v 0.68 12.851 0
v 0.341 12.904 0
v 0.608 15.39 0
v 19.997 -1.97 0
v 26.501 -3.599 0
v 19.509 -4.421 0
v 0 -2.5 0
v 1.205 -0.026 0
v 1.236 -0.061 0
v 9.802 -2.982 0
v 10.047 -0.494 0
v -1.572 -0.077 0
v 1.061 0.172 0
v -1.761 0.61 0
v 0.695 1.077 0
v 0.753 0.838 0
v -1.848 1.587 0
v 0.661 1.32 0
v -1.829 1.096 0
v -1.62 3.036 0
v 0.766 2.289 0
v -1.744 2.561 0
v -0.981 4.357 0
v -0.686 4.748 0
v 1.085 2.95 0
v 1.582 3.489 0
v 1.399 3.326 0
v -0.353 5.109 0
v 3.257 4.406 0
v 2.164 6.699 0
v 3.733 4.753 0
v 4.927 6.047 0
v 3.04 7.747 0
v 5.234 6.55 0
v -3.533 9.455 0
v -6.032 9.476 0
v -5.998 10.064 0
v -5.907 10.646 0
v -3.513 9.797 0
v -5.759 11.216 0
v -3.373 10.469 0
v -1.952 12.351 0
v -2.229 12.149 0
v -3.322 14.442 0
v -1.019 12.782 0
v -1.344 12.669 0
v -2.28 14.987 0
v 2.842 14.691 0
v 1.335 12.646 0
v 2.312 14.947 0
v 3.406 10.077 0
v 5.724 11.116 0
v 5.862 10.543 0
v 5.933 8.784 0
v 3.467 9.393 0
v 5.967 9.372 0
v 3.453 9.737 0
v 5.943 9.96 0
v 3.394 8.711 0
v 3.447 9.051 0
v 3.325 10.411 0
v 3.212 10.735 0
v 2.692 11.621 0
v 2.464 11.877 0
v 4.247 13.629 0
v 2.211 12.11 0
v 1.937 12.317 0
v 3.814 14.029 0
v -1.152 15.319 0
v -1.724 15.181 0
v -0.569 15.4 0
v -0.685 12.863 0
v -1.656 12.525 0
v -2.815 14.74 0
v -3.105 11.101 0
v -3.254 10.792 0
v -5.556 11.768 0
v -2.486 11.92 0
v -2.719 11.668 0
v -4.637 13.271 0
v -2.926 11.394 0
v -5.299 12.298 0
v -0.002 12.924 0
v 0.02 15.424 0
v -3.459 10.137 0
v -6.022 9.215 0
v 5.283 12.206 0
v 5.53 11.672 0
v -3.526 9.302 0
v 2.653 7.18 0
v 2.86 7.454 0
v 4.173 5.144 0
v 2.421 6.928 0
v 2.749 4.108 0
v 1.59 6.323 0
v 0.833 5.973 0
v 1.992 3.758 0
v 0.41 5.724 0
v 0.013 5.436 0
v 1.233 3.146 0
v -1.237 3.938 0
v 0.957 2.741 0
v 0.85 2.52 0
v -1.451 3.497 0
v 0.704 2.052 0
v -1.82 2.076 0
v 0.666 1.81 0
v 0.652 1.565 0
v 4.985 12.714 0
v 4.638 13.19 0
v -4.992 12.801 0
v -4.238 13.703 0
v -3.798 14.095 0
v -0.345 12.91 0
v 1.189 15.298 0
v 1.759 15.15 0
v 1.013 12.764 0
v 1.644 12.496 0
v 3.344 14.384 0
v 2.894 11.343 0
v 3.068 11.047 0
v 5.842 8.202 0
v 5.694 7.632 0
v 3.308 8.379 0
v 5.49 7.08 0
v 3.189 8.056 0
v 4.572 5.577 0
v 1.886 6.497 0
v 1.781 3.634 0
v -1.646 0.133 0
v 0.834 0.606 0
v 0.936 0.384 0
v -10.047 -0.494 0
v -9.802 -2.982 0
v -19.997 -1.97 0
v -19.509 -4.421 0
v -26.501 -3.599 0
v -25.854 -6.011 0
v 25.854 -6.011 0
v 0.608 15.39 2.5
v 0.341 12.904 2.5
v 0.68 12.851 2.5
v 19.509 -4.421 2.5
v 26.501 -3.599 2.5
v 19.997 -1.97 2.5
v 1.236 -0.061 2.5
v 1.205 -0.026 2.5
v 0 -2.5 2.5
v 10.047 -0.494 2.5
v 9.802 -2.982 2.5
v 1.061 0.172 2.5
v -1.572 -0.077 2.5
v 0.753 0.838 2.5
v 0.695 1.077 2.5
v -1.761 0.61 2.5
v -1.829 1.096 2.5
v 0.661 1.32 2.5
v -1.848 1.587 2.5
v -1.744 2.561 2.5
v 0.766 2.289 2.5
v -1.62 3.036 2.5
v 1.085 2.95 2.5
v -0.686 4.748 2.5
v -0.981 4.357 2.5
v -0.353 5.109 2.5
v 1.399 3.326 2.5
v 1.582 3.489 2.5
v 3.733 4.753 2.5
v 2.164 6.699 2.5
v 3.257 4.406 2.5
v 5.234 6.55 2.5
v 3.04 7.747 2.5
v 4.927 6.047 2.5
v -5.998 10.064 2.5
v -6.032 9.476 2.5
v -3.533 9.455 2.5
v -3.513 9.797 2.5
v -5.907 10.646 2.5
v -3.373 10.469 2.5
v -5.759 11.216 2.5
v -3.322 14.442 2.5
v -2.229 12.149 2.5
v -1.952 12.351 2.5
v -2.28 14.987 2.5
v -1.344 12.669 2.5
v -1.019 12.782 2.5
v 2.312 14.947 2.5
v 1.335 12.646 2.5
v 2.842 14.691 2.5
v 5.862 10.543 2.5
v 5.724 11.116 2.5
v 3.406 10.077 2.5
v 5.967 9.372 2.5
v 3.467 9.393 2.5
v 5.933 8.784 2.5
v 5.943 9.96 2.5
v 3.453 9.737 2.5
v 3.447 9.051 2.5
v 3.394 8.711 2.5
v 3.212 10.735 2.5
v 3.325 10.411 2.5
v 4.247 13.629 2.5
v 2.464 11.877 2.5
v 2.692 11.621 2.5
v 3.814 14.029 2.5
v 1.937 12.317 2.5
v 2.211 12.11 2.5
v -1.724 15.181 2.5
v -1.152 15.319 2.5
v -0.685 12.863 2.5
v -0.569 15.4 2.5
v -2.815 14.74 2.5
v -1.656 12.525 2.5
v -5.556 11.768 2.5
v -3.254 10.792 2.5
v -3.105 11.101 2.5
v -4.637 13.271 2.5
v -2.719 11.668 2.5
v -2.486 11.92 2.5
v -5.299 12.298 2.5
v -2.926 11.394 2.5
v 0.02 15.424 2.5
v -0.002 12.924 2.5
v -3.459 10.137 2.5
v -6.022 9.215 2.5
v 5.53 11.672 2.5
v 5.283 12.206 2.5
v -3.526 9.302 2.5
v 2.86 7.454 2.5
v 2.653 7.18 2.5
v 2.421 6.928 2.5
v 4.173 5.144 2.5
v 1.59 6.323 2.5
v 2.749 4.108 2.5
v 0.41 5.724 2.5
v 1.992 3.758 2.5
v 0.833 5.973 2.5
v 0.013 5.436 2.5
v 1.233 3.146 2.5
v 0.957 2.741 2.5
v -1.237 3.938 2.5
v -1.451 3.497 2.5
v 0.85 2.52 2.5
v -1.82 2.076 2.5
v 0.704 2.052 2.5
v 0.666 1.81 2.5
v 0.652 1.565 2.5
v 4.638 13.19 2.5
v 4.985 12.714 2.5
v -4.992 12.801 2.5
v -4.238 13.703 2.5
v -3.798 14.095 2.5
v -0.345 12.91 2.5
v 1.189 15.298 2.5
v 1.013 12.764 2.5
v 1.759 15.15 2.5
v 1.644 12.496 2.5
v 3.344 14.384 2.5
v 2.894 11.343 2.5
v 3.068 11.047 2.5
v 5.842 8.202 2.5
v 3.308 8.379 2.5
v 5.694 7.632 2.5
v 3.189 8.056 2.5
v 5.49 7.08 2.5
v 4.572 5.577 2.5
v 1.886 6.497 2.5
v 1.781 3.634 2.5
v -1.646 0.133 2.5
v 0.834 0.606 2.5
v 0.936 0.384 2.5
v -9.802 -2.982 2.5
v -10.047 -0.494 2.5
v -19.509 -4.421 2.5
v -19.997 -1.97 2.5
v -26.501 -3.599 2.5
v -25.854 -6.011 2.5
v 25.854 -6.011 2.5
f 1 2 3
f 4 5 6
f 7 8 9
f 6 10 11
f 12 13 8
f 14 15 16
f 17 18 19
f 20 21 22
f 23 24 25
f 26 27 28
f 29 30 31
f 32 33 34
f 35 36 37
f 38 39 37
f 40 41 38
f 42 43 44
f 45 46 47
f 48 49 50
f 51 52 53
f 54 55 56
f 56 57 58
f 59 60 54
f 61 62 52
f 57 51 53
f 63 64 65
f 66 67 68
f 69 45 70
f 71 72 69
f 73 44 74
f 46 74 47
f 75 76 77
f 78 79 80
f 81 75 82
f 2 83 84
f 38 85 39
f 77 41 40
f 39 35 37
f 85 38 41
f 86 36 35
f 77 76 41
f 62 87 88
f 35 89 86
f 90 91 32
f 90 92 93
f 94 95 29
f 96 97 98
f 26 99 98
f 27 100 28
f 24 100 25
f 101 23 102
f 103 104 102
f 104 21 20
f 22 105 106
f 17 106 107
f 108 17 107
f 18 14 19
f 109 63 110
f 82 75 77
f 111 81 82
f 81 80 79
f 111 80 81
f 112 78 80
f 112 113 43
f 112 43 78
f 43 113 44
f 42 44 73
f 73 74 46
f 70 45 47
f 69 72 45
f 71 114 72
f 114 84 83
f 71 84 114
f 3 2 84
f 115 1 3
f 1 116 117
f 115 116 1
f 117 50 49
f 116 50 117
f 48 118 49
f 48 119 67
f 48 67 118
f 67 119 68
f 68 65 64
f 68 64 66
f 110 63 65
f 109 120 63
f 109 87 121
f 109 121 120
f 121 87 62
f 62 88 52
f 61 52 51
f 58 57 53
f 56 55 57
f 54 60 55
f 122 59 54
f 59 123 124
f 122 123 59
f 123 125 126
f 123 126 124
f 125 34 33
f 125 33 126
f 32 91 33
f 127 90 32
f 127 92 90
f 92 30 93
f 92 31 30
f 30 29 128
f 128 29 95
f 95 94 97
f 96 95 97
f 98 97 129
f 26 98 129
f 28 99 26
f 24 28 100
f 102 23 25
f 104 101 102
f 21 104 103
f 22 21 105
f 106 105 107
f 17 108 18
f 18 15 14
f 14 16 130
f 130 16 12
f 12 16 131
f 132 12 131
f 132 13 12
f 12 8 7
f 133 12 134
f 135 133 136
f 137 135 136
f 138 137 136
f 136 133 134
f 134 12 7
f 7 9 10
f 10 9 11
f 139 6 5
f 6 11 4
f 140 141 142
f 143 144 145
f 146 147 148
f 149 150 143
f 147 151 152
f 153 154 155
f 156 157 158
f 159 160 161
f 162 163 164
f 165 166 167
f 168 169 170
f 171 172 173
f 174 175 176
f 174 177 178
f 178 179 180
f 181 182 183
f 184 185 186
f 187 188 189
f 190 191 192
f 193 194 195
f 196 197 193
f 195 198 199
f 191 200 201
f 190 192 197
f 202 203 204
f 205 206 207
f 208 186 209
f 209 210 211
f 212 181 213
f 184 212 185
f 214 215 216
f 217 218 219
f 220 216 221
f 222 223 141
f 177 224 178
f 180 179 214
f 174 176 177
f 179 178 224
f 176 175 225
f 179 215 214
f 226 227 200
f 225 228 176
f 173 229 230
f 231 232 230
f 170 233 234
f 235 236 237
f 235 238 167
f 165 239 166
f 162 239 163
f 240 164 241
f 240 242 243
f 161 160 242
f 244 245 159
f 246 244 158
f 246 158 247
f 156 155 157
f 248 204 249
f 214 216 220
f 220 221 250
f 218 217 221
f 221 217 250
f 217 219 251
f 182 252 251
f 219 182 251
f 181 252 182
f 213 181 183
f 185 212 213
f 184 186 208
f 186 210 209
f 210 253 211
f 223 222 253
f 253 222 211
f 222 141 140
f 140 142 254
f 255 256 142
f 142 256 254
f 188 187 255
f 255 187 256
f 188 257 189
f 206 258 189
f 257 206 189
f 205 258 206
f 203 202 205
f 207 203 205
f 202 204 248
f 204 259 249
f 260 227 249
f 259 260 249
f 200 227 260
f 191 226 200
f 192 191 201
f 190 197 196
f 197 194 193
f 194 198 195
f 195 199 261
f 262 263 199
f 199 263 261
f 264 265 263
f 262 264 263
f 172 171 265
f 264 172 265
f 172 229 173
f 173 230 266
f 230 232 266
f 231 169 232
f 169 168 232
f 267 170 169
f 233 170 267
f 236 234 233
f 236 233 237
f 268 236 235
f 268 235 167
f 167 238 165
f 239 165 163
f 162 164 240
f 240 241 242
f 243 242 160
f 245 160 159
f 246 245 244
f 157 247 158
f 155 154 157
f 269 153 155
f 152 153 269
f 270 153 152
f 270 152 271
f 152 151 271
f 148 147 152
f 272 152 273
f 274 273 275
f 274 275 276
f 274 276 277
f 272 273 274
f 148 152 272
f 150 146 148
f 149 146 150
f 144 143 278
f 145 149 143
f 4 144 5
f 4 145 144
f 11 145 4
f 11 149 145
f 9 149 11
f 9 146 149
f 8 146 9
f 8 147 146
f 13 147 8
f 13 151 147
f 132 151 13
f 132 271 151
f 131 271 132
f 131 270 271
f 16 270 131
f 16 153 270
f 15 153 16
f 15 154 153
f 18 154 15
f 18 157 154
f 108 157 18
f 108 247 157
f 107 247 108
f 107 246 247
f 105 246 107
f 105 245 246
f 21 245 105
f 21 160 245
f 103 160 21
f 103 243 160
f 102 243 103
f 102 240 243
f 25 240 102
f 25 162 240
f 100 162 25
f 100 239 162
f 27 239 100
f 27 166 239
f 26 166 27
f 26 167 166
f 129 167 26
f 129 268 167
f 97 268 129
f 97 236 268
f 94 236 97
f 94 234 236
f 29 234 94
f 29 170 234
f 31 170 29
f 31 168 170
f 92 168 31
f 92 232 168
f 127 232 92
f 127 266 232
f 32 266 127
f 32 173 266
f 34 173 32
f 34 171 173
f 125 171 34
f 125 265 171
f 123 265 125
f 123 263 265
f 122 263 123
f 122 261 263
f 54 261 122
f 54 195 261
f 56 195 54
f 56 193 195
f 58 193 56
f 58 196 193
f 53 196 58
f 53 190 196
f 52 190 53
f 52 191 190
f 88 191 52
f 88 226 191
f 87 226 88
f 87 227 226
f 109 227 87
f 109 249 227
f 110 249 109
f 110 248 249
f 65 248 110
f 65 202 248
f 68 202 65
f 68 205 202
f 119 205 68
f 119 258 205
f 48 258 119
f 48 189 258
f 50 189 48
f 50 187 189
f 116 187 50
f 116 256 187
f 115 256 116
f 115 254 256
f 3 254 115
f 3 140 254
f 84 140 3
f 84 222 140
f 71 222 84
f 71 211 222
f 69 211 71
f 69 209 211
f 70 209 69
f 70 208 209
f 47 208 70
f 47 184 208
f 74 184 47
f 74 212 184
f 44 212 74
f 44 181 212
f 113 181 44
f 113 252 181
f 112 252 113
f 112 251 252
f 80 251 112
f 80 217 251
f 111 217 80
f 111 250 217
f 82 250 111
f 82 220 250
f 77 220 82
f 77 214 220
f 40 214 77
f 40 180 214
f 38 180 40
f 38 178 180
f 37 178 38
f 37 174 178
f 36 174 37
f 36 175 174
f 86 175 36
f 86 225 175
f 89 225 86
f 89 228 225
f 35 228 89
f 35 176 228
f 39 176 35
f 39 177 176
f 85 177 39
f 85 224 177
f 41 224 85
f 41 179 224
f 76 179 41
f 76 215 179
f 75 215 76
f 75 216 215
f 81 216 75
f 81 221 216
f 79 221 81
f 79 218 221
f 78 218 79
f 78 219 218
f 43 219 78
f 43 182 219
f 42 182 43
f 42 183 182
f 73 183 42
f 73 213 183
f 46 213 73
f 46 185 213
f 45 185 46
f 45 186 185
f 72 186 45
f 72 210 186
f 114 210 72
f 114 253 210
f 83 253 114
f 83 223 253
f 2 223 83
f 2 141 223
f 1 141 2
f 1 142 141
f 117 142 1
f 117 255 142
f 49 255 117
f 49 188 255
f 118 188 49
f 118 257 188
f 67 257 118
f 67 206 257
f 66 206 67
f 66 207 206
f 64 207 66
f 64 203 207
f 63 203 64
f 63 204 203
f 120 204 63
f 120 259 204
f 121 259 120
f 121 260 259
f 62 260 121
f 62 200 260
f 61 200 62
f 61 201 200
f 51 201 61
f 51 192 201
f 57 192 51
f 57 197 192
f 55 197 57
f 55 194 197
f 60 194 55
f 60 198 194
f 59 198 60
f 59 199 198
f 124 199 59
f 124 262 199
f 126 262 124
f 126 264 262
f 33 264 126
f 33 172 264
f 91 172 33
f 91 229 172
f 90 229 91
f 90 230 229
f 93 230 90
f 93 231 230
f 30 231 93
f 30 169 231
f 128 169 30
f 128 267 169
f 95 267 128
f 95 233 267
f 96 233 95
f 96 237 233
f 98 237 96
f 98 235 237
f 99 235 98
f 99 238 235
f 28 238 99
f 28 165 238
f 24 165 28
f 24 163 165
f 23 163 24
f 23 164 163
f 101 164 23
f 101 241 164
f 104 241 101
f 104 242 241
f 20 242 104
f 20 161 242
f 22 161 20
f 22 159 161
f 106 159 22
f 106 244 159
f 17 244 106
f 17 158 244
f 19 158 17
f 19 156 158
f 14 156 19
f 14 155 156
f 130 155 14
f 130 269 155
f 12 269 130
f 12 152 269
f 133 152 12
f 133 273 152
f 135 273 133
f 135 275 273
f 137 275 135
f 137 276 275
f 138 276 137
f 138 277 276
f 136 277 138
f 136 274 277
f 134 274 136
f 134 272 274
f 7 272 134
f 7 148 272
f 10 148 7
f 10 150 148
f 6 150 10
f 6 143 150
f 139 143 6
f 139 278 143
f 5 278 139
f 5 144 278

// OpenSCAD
// file: lib/arc.scad
radius = 20;
angles = [10, 90];
width = 2;
fn = 24;

module sector(radius, angles, fn = 24) {
    r = radius / cos(180 / fn);
    step = -360 / fn;

    points = concat([[0, 0]],
        [for(a = [angles[0] : step : angles[1] - 360]) 
            [r * cos(a), r * sin(a)]
        ],
        [[r * cos(angles[1]), r * sin(angles[1])]]
    );

    difference() {
        circle(radius, $fn = fn);
        polygon(points);
    }
}

module arc(radius, angles, width = 1, fn = 24) {
    difference() {
        sector(radius + width, angles, fn);
        sector(radius, angles, fn);
    }
} 

module arc_demo(){
  sector(15, [0,30]);

  translate([20,0,0])
  arc(10, [0,45], 1.2, 24);
}
// main file
include <lib/arc.scad>

//suporte
se=2.5;
sl=15;
sr = 100;


//gancho
gr = 6;


sl2 = sl/2;
sl4 = sl/4;

$fn = 100;

module suporte(sr, sl, se) {
translate([0,-sr -se,0])
arc(sr,[90 -  sl, 90 + sl], se, fn=64);
}

module gancho(gr,se){
    ah = gr;
    bh = se/2;
    
    rotate([0,0,22])
    translate([1,0,0])
    translate([se,ah + bh +se -1,0]) {
        arc(gr - se,[-90, 160], se, fn=64);
        
        translate([0,-se- gr,0])        
        arc(se,[90, 200], se, fn=64);
    }
}
linear_extrude(se) {
gancho(gr,se);
suporte(sr, sl, se);
}
